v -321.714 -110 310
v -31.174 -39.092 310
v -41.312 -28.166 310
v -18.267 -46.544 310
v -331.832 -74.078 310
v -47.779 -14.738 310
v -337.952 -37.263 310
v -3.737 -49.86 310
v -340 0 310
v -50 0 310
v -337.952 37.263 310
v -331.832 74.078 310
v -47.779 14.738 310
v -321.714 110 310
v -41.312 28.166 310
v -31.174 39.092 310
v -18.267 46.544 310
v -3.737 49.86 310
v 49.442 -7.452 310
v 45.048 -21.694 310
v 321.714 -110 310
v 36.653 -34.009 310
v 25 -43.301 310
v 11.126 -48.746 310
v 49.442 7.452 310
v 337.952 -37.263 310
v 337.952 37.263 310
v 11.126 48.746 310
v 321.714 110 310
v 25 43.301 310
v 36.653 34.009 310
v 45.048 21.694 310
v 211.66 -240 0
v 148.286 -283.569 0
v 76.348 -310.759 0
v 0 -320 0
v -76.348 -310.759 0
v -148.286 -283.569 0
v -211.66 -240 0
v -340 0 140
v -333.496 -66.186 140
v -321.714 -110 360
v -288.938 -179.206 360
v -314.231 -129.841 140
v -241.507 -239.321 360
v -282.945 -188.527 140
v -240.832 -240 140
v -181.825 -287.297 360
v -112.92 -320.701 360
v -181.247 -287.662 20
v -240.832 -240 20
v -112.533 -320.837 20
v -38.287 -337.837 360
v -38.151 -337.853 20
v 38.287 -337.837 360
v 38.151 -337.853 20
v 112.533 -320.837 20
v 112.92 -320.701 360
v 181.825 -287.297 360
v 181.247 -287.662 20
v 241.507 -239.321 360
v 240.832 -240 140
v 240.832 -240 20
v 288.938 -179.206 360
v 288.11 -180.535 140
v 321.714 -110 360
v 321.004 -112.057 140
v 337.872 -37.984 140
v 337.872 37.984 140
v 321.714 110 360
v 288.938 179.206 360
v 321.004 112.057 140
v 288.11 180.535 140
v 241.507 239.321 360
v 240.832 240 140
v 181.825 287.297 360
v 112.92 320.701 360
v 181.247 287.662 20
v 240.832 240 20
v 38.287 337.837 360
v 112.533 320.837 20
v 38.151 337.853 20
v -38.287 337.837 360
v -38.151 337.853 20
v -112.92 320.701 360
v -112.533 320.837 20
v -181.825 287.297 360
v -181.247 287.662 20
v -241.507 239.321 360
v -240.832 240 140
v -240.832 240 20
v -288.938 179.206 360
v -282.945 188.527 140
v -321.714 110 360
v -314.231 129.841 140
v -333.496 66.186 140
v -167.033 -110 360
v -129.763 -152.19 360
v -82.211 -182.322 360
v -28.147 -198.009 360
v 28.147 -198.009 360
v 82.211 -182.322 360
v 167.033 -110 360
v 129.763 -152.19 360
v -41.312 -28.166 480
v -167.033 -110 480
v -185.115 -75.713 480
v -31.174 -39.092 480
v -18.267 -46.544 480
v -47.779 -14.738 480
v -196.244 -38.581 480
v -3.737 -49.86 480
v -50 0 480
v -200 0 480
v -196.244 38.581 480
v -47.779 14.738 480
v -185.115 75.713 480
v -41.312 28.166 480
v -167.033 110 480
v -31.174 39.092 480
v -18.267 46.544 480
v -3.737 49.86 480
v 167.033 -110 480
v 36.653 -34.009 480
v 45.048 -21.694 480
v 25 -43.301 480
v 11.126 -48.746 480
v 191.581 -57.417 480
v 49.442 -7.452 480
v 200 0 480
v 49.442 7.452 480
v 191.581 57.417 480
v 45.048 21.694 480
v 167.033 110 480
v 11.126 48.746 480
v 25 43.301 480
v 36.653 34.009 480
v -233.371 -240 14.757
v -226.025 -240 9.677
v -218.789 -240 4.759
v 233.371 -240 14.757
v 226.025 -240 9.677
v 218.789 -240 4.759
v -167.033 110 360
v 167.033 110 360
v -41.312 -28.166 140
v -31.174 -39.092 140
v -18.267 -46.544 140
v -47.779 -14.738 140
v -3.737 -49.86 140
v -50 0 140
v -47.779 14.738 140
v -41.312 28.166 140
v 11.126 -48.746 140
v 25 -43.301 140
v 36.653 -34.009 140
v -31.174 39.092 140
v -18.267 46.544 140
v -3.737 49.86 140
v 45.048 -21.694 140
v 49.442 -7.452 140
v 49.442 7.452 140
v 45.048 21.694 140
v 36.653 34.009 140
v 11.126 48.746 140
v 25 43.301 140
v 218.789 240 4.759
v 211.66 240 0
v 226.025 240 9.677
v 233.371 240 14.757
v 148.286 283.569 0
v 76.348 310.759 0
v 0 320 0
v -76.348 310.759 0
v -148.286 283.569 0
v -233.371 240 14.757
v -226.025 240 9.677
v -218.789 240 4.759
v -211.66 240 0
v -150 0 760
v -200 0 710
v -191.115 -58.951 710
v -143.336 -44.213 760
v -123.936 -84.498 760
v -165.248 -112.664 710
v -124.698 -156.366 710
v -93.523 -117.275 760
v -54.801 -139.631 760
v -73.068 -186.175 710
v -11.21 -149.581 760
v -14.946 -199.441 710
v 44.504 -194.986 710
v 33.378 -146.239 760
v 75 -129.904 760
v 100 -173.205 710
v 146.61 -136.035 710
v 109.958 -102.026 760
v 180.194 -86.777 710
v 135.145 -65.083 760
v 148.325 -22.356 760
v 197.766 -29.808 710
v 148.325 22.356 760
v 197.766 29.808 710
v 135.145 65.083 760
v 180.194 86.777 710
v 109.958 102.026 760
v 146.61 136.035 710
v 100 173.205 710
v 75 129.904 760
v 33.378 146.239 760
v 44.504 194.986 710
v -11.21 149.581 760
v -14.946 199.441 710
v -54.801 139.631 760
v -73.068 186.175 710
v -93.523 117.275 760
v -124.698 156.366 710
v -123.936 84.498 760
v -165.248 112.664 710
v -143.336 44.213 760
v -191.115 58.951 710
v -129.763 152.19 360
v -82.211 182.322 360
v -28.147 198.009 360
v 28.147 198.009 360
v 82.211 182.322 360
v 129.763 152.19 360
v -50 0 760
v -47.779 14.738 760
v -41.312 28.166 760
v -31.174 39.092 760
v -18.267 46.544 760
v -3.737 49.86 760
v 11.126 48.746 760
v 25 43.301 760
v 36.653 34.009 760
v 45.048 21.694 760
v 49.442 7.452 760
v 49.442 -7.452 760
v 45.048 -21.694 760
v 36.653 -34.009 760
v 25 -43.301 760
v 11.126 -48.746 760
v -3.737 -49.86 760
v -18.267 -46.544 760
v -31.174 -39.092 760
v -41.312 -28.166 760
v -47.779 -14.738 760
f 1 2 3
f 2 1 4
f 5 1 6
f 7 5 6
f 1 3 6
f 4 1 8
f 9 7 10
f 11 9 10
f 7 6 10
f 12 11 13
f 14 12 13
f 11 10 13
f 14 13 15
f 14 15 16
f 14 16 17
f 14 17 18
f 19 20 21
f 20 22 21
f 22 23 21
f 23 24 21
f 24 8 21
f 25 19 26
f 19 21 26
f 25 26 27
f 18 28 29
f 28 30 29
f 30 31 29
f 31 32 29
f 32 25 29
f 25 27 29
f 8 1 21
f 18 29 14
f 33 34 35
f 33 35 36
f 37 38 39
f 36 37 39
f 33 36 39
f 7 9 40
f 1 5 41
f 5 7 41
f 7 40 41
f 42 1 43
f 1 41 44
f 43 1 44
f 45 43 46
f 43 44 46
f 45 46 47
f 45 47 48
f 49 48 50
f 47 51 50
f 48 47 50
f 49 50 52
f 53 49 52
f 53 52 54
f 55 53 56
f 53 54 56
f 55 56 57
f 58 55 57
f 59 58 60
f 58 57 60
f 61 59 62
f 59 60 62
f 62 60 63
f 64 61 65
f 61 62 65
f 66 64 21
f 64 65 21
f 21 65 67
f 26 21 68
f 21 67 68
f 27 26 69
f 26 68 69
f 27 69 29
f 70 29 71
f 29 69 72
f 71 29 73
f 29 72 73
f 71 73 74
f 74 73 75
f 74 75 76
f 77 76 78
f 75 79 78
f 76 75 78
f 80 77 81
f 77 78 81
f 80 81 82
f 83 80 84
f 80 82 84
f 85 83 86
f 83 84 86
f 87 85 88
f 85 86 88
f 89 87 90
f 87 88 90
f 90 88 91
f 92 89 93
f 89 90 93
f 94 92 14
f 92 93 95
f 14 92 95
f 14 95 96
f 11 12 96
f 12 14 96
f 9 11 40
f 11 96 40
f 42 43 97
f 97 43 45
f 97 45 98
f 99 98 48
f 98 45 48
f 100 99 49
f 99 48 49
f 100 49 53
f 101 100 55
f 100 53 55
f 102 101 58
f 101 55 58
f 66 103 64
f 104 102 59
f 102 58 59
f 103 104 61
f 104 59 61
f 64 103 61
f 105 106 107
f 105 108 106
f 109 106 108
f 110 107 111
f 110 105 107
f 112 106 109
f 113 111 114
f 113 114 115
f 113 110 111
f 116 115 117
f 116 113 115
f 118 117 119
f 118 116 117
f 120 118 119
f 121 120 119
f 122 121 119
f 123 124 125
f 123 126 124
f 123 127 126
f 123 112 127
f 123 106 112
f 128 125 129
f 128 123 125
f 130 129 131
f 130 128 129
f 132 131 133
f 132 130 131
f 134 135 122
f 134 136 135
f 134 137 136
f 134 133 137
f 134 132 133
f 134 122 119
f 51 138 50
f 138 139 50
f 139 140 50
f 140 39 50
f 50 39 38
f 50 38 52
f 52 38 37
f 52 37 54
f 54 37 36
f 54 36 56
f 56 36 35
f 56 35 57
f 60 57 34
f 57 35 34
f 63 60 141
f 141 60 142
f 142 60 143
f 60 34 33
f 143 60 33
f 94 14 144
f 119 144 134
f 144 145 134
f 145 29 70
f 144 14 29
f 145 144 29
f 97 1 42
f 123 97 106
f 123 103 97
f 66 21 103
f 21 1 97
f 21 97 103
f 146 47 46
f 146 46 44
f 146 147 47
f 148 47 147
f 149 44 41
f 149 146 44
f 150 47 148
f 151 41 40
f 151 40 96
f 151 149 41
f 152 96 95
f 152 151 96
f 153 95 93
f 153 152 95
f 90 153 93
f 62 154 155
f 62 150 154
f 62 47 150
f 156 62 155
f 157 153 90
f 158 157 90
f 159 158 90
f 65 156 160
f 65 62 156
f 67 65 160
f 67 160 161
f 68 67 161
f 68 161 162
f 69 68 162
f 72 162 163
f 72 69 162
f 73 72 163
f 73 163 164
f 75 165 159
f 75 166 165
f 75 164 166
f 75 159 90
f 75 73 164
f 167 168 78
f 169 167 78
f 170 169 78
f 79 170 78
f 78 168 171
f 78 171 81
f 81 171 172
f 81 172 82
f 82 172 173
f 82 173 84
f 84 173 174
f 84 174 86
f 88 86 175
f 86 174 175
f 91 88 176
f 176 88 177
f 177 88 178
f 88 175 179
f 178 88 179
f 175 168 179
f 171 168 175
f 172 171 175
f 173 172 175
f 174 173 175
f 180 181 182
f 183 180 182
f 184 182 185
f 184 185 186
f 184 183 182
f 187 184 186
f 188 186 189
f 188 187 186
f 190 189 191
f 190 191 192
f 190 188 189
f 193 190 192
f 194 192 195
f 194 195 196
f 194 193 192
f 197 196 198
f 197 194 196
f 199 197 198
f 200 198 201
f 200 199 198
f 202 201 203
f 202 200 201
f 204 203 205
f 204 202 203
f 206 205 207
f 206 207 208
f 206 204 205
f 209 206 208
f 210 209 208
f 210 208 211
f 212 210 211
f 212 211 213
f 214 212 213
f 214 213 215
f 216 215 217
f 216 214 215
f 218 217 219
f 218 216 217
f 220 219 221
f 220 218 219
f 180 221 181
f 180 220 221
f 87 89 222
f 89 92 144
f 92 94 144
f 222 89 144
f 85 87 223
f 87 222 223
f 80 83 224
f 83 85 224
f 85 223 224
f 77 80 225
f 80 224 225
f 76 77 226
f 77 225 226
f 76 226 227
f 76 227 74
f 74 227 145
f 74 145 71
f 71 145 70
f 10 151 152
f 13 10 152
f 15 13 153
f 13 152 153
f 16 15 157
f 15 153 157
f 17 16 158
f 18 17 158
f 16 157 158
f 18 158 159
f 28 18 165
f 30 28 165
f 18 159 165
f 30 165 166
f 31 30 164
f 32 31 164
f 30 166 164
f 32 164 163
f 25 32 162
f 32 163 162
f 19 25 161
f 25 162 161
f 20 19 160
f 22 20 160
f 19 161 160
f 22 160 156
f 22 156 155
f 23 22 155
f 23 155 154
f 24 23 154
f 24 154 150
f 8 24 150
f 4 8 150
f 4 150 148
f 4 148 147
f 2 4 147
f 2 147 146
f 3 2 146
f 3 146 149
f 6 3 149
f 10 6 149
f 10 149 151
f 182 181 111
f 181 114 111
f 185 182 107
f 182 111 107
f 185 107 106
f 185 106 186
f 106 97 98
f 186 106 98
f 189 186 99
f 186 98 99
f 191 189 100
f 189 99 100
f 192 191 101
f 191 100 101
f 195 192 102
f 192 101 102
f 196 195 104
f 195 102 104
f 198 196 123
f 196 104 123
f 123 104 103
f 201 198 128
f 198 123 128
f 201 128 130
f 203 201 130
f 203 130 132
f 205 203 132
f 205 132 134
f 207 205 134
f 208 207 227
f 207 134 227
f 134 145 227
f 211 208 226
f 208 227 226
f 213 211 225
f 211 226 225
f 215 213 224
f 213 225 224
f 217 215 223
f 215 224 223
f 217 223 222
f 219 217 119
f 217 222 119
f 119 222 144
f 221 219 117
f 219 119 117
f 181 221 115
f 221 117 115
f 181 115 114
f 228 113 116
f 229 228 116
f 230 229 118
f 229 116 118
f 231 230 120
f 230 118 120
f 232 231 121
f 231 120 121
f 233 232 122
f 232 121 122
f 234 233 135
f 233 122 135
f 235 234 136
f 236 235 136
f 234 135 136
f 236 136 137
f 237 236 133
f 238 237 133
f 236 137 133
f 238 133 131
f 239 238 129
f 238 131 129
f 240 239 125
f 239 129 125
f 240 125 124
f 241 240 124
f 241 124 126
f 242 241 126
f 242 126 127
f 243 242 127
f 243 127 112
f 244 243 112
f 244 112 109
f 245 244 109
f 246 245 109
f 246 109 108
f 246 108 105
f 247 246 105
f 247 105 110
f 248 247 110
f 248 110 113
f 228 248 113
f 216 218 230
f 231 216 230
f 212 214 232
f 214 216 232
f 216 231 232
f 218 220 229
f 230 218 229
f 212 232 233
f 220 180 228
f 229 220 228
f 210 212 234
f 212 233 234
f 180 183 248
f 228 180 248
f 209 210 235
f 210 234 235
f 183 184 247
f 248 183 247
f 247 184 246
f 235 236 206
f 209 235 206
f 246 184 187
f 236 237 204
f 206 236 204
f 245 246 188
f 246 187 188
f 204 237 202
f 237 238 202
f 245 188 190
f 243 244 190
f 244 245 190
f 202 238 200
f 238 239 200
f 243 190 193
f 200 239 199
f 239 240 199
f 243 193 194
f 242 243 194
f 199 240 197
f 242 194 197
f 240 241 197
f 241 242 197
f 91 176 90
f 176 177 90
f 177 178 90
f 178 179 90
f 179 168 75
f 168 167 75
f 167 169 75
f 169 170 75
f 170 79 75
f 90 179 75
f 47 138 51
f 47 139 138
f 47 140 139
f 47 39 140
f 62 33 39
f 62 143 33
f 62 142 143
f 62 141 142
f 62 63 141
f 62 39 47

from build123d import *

# Parameters (mm, degrees)
F2_SIZE  = 20
F3_SIZE  = 50
F4_W     = 480
F4_H     = 140
F5_DEPTH = 340
F6_W     = 220
F6_H     = 170
F7_DEPTH = 340
F9_D     = 100


with BuildPart() as f1:
    # F0 (on Front) → F1 (revolve)
    with BuildSketch(Plane.XZ):
        Polygon((0, 0), (0, 760), (-200, 760), (-200, 360), (-340, 360), (-340, 0), align=None)
    revolve(axis=Axis((0, 0, 380), (0, 0, 1)))

    # F2
    f2_edges = [f1.edges().sort_by_distance(p)[0] for p in [
        (340, 0, 0),
    ]]
    chamfer(f2_edges, length=F2_SIZE)

    # F3
    f3_edges = [f1.edges().sort_by_distance(p)[0] for p in [
        (200, 0, 760),
    ]]
    chamfer(f3_edges, length=F3_SIZE)

    # F4 (on Right) → F5 (cut, symmetric)
    with BuildSketch(Plane.YZ):
        with Locations((0, 70)):
            Rectangle(F4_W, F4_H)
    extrude(amount=F5_DEPTH, both=True, mode=Mode.SUBTRACT)

    # F6 (on Right) → F7 (cut, symmetric)
    with BuildSketch(Plane.YZ):
        with Locations((0, 395)):
            Rectangle(F6_W, F6_H)
    extrude(amount=F7_DEPTH, both=True, mode=Mode.SUBTRACT)

    # F9 (through all)
    with Locations(Plane.XY.offset(760)):
        with Locations((0, 0)):
            Hole(F9_D / 2)


solid = f1.part
